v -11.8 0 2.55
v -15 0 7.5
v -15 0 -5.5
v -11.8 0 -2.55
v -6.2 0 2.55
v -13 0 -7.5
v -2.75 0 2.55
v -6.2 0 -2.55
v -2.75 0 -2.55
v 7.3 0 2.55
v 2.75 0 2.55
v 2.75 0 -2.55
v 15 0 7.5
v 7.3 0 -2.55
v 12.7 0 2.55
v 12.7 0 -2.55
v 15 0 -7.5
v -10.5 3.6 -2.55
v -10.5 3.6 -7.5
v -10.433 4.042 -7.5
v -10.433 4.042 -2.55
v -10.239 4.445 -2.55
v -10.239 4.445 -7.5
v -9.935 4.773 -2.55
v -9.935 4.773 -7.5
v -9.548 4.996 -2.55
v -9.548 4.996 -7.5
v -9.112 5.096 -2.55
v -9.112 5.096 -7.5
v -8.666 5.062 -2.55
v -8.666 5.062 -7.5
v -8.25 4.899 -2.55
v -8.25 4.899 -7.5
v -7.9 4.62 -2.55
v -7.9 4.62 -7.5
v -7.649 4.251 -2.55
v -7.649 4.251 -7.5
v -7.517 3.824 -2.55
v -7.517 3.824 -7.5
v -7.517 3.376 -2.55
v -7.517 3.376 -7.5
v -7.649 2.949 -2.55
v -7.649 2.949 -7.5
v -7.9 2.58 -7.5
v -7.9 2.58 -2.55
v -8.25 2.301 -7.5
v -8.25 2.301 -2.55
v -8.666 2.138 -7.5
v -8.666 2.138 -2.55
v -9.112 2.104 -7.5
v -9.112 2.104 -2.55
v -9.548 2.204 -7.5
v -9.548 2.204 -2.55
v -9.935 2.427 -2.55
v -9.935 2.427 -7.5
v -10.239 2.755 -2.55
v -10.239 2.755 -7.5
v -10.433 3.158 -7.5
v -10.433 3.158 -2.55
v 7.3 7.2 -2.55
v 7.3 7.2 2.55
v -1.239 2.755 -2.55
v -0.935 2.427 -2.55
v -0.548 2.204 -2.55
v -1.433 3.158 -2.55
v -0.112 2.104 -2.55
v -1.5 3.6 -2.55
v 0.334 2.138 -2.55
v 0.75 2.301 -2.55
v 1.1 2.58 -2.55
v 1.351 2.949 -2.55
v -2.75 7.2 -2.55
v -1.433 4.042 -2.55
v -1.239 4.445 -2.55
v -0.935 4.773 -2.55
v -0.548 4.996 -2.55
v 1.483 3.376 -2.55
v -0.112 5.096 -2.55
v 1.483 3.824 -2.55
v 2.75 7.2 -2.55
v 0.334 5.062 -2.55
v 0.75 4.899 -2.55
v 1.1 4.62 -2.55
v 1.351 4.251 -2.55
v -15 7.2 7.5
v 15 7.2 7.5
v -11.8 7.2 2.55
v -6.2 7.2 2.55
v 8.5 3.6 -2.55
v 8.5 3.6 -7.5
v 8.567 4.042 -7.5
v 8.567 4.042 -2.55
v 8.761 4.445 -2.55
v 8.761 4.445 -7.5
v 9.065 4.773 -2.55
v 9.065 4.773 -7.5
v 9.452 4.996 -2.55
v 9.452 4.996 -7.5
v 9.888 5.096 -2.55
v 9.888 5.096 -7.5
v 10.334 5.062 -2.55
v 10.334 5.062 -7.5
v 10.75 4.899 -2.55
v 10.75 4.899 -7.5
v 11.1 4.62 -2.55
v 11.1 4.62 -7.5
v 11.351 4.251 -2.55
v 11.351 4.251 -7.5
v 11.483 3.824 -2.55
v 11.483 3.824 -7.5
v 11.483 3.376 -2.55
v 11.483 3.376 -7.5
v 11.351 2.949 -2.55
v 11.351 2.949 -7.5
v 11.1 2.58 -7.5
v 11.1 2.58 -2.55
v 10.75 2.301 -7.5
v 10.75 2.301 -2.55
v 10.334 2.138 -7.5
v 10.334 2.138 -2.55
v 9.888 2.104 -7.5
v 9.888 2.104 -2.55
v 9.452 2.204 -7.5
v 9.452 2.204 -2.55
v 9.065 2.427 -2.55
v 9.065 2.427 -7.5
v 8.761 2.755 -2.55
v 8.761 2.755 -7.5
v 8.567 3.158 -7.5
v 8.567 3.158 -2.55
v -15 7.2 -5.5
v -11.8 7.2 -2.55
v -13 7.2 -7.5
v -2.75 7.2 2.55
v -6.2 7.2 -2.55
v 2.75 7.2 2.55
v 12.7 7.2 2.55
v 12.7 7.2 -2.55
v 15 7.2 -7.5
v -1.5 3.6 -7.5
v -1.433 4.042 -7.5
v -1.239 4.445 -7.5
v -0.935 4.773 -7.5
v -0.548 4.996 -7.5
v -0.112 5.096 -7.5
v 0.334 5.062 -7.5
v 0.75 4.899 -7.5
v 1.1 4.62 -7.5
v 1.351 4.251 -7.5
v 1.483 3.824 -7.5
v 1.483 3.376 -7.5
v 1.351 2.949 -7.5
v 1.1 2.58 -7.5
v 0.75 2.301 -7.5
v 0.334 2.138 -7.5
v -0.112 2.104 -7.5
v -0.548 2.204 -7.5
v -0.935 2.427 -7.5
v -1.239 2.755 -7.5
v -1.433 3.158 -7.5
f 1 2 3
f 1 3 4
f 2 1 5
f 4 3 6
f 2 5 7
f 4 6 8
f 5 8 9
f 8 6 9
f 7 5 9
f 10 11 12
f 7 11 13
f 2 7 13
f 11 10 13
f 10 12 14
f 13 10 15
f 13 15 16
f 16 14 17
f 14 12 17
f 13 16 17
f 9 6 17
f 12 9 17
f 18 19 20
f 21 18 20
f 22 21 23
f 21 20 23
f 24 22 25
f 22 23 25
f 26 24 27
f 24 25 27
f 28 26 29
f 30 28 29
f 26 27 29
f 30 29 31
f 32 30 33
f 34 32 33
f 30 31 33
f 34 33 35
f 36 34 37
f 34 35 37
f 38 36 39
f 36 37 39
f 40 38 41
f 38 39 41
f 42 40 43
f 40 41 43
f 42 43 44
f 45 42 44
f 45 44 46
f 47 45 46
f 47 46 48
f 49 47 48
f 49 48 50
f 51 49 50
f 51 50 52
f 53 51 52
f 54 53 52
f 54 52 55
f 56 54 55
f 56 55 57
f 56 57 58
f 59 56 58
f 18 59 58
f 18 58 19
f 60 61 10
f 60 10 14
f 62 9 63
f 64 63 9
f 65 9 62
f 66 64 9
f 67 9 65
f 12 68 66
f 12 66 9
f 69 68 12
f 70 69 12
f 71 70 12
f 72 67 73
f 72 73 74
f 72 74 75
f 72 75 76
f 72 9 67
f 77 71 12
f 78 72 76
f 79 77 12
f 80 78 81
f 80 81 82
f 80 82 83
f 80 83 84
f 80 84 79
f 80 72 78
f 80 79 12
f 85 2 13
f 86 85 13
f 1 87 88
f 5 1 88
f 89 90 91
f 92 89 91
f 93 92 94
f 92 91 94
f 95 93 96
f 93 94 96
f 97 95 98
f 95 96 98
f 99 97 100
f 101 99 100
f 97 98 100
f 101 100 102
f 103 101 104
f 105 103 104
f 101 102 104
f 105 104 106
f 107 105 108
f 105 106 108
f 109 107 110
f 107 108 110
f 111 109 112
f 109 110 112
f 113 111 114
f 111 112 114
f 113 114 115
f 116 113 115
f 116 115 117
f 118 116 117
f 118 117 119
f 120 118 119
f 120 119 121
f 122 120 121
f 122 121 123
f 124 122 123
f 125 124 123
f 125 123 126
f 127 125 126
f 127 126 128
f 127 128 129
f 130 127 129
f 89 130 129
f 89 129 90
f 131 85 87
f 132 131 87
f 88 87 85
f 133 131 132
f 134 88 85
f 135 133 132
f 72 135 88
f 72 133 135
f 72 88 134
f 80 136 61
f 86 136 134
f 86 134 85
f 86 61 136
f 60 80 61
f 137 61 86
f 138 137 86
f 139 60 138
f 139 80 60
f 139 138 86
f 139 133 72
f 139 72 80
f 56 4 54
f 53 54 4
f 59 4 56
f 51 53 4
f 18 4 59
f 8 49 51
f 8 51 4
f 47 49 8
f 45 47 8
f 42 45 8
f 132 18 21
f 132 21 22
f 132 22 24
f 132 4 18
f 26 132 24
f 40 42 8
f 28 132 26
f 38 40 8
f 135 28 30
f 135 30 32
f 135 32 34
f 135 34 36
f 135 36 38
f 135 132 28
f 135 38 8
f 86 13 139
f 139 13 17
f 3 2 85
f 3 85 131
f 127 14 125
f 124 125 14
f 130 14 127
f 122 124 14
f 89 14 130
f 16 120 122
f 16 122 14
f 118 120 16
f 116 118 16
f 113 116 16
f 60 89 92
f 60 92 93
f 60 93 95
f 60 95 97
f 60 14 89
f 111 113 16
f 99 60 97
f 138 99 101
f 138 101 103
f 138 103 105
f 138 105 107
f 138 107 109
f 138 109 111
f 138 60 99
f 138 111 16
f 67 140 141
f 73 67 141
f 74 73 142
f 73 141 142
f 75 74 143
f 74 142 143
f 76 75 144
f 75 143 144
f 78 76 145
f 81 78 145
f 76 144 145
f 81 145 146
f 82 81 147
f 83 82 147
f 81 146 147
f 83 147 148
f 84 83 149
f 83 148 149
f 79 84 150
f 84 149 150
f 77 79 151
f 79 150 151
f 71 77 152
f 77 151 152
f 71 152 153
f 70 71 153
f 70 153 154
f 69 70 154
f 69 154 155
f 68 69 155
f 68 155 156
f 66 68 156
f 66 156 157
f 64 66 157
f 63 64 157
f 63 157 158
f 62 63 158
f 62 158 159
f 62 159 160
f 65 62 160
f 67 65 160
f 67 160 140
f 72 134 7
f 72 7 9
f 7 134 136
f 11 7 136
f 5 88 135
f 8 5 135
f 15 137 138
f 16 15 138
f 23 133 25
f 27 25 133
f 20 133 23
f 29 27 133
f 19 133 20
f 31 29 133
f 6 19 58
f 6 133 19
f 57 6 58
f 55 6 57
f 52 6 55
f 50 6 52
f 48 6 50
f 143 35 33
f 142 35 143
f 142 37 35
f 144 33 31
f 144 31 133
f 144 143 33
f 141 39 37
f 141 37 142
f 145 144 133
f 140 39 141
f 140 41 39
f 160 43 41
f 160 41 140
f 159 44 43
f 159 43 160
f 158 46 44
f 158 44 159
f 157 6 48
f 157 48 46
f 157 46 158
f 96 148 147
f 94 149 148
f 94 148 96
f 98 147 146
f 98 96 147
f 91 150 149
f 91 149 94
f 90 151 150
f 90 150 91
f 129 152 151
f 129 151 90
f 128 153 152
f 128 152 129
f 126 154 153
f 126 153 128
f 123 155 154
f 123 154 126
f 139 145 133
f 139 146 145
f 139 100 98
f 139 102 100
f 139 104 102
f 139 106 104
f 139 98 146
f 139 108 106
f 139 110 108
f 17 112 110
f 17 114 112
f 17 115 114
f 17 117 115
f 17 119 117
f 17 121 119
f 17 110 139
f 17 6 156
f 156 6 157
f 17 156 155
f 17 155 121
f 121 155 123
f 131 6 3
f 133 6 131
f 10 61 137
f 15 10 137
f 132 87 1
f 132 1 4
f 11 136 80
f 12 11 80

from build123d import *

# Parameters (mm, degrees)
SKETCH1_W           = 30
SKETCH1_H           = 15
BOSS_EXTRUDE1_DEPTH = 7.2
SKETCH2_W           = 5.6
SKETCH2_H           = 5.1
SKETCH2_W_2         = 5.5
SKETCH2_W_3         = 5.4
CUT_EXTRUDE1_DEPTH  = 7.2
SKETCH4_R           = 1.5
CUT_EXTRUDE2_DEPTH  = 7.2
CHAMFER1_SIZE       = 2


with BuildPart() as part:
    # Sketch1 → Boss-Extrude1 (new body)
    with BuildSketch(Plane(origin=(0, 0, 0), x_dir=(1, 0, 0), z_dir=(0, 1, 0))):
        Rectangle(SKETCH1_W, SKETCH1_H)
    extrude(amount=BOSS_EXTRUDE1_DEPTH)

    # Sketch2 → Cut-Extrude1 (cut)
    with BuildSketch(Plane(origin=(0, 7.2, 0), x_dir=(1, 0, 0), z_dir=(0, 1, 0))):
        with Locations((-9, 0)):
            Rectangle(SKETCH2_W, SKETCH2_H)
        Rectangle(SKETCH2_W_2, SKETCH2_H)
        with Locations((10, 0)):
            Rectangle(SKETCH2_W_3, SKETCH2_H)
    extrude(amount=-CUT_EXTRUDE1_DEPTH, mode=Mode.SUBTRACT)

    # Sketch4 → Cut-Extrude2 (cut)
    with BuildSketch(Plane(origin=(0, 0, -7.5), x_dir=(-1, 0, 0), z_dir=(0, 0, -1))):
        with Locations((9, 3.6)):
            Circle(SKETCH4_R)
        with Locations((0, 3.6)):
            Circle(SKETCH4_R)
        with Locations((-10, 3.6)):
            Circle(SKETCH4_R)
    extrude(amount=-CUT_EXTRUDE2_DEPTH, mode=Mode.SUBTRACT)

    # Chamfer1
    chamfer1_edges = [part.edges().sort_by_distance(p)[0] for p in [
        (-15, 3.6, -7.5),
    ]]
    chamfer(chamfer1_edges, length=CHAMFER1_SIZE)


solid = part.part
